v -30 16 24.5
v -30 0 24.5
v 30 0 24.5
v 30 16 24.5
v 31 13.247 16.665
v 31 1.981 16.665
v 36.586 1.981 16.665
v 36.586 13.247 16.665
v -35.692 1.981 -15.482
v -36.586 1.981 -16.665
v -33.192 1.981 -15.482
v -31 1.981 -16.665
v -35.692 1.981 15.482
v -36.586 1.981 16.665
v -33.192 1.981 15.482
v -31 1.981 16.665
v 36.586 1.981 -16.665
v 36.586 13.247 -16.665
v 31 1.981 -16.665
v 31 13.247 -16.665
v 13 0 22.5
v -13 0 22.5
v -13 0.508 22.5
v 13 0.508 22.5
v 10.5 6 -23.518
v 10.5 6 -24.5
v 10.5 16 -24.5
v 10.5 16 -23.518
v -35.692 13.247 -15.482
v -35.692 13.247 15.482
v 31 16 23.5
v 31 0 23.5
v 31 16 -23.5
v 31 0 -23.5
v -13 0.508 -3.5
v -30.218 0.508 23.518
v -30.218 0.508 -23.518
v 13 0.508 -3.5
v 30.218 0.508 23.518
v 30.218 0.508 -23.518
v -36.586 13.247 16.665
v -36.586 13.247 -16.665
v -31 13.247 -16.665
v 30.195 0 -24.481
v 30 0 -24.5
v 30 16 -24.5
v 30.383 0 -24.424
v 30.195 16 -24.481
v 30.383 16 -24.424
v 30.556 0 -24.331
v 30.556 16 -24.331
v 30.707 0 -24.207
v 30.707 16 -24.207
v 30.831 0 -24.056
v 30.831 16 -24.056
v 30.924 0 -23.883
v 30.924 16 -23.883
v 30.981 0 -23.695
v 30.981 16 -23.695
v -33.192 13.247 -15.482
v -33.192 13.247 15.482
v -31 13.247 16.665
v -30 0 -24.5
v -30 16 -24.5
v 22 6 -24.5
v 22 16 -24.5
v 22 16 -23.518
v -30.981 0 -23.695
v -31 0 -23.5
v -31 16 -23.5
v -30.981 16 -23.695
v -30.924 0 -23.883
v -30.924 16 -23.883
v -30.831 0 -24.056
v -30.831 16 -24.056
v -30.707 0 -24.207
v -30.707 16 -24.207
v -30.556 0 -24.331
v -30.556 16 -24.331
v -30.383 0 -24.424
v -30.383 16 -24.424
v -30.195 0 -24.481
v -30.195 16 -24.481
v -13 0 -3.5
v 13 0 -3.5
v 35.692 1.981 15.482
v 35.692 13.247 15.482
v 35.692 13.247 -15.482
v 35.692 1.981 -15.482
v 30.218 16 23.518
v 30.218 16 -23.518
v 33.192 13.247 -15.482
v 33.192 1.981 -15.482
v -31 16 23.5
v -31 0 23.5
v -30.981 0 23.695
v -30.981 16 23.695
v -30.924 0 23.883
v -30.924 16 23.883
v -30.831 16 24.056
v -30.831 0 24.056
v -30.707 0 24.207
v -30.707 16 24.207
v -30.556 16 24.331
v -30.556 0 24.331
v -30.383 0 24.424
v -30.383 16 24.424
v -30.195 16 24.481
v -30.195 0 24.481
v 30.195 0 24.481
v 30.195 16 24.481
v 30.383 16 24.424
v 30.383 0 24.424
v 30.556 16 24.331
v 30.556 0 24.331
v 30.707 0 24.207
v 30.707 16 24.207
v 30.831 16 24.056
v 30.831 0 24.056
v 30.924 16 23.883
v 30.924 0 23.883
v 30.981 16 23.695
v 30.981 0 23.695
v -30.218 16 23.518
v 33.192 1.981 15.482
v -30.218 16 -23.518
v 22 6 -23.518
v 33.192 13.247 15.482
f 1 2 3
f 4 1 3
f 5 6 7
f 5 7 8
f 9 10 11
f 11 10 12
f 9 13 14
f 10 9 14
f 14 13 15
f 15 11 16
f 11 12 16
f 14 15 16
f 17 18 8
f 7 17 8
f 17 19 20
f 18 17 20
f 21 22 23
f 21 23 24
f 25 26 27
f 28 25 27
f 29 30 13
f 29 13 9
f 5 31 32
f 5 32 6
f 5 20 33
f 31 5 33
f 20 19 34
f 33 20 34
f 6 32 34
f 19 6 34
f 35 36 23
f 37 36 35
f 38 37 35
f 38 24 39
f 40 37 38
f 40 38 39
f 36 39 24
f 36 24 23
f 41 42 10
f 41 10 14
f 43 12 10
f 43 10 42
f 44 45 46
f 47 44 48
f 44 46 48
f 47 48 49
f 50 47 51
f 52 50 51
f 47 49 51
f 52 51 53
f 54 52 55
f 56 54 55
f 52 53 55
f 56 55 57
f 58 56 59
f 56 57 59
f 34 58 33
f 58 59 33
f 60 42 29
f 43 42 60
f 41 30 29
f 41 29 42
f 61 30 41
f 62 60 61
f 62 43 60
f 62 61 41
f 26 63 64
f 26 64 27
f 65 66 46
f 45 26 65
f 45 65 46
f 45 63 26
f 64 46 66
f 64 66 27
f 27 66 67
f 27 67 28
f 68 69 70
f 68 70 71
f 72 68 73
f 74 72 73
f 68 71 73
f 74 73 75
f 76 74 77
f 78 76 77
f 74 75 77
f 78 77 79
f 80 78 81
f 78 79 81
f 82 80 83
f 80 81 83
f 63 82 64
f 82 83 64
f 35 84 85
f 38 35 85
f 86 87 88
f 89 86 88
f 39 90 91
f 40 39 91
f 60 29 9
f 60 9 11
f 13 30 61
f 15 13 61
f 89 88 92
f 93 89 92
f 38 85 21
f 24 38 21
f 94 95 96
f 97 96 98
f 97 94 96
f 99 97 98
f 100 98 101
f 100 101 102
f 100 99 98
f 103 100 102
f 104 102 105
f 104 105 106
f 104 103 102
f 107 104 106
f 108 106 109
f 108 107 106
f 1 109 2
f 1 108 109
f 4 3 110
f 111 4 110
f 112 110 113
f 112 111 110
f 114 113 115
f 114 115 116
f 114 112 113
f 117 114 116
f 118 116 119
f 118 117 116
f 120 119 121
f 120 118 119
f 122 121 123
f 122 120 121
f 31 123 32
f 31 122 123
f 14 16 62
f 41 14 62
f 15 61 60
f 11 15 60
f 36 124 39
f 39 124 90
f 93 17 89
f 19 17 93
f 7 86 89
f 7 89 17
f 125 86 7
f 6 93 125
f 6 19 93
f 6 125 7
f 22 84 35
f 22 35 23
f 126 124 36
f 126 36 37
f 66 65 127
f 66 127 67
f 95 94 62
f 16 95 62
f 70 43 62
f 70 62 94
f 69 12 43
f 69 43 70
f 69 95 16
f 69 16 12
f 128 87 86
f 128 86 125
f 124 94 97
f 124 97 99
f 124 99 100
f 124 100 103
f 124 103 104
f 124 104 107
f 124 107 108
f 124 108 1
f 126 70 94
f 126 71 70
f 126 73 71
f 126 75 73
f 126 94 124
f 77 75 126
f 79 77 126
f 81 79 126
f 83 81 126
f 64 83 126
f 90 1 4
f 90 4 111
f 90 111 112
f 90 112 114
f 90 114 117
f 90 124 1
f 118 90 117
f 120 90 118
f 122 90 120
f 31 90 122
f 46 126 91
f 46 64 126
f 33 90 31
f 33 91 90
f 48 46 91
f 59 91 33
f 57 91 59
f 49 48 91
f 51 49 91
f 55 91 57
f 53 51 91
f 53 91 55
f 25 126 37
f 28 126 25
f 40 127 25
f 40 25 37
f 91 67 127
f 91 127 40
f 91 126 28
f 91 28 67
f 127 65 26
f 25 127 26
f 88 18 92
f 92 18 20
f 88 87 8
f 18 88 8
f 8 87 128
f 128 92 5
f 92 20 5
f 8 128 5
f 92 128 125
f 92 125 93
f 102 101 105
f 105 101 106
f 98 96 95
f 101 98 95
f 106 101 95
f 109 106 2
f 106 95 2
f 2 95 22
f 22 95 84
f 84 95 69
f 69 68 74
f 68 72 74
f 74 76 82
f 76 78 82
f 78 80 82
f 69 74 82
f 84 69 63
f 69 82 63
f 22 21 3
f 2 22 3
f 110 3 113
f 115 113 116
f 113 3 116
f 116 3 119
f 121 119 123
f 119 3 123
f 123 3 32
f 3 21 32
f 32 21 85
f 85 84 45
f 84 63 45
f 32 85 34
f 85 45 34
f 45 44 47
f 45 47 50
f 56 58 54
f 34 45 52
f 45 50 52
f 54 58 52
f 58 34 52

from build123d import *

# Parameters (mm, degrees)
SKETCH2_W           = 62
SKETCH2_H           = 49
BOSS_EXTRUDE2_DEPTH = 16
SKETCH3_W           = 60.436043862
SKETCH3_H           = 47.036060162
CUT_EXTRUDE2_DEPTH  = 15.492
SKETCH4_W           = 26
SKETCH4_H           = 26
CUT_EXTRUDE3_DEPTH  = 1.014
SKETCH6_W           = 11.5
SKETCH6_H           = 10
CUT_EXTRUDE4_DEPTH  = 1.014
FILLET3_R           = 1
SKETCH8_W           = 33.330843918
SKETCH8_H           = 11.266105729
BOSS_EXTRUDE3_DEPTH = 5.586
SKETCH9_W           = 2.5
SKETCH9_H           = 30.963135996
CUT_EXTRUDE5_DEPTH  = 13.714


with BuildPart() as part:
    # Sketch2 → Boss-Extrude2 (new body)
    with BuildSketch(Plane(origin=(0, 0, 0), x_dir=(1, 0, 0), z_dir=(0, 1, 0))):
        Rectangle(SKETCH2_W, SKETCH2_H)
    extrude(amount=BOSS_EXTRUDE2_DEPTH)

    # Sketch3 → Cut-Extrude2 (cut)
    with BuildSketch(Plane(origin=(0, 16, 0), x_dir=(1, 0, 0), z_dir=(0, 1, 0))):
        Rectangle(SKETCH3_W, SKETCH3_H)
    extrude(amount=-CUT_EXTRUDE2_DEPTH, mode=Mode.SUBTRACT)

    # Sketch4 → Cut-Extrude3 (cut)
    with BuildSketch(Plane.XZ):
        with Locations((0, 9.5)):
            Rectangle(SKETCH4_W, SKETCH4_H)
    extrude(amount=-CUT_EXTRUDE3_DEPTH, mode=Mode.SUBTRACT)

    # Sketch6 → Cut-Extrude4 (cut)
    with BuildSketch(Plane(origin=(0, 0, -24.5), x_dir=(-1, 0, 0), z_dir=(0, 0, -1))):
        with Locations((-16.25, 10.9998)):
            Rectangle(SKETCH6_W, SKETCH6_H)
    extrude(amount=-CUT_EXTRUDE4_DEPTH, mode=Mode.SUBTRACT)

    # Fillet3
    fillet3_edges = [part.edges().sort_by_distance(p)[0] for p in [
        (31, 8, 24.5),
        (-31, 8, 24.5),
        (-31, 8, -24.5),
        (31, 8, -24.5),
    ]]
    fillet(fillet3_edges, radius=FILLET3_R)

    # Sketch8 → Boss-Extrude3 (add)
    with BuildSketch(Plane.ZY.offset(31)):
        with Locations((0, 7.613654272)):
            Rectangle(SKETCH8_W, SKETCH8_H)
    boss_extrude3 = extrude(amount=BOSS_EXTRUDE3_DEPTH)

    # Sketch9 → Cut-Extrude5 (cut)
    with BuildSketch(Plane(origin=(0, 13.246707136, 0), x_dir=(1, 0, 0), z_dir=(0, 1, 0))):
        with Locations((-34.442433929, 0)):
            Rectangle(SKETCH9_W, SKETCH9_H)
    cut_extrude5 = extrude(amount=-CUT_EXTRUDE5_DEPTH, mode=Mode.SUBTRACT)

    # Mirror1: Boss-Extrude3, Cut-Extrude5 across plane
    add(boss_extrude3.mirror(Plane(origin=(0, 0, 0), x_dir=(0, 0, 1), z_dir=(1, 0, 0))))
    add(cut_extrude5.mirror(Plane(origin=(0, 0, 0), x_dir=(0, 0, 1), z_dir=(1, 0, 0))), mode=Mode.SUBTRACT)


solid = part.part
